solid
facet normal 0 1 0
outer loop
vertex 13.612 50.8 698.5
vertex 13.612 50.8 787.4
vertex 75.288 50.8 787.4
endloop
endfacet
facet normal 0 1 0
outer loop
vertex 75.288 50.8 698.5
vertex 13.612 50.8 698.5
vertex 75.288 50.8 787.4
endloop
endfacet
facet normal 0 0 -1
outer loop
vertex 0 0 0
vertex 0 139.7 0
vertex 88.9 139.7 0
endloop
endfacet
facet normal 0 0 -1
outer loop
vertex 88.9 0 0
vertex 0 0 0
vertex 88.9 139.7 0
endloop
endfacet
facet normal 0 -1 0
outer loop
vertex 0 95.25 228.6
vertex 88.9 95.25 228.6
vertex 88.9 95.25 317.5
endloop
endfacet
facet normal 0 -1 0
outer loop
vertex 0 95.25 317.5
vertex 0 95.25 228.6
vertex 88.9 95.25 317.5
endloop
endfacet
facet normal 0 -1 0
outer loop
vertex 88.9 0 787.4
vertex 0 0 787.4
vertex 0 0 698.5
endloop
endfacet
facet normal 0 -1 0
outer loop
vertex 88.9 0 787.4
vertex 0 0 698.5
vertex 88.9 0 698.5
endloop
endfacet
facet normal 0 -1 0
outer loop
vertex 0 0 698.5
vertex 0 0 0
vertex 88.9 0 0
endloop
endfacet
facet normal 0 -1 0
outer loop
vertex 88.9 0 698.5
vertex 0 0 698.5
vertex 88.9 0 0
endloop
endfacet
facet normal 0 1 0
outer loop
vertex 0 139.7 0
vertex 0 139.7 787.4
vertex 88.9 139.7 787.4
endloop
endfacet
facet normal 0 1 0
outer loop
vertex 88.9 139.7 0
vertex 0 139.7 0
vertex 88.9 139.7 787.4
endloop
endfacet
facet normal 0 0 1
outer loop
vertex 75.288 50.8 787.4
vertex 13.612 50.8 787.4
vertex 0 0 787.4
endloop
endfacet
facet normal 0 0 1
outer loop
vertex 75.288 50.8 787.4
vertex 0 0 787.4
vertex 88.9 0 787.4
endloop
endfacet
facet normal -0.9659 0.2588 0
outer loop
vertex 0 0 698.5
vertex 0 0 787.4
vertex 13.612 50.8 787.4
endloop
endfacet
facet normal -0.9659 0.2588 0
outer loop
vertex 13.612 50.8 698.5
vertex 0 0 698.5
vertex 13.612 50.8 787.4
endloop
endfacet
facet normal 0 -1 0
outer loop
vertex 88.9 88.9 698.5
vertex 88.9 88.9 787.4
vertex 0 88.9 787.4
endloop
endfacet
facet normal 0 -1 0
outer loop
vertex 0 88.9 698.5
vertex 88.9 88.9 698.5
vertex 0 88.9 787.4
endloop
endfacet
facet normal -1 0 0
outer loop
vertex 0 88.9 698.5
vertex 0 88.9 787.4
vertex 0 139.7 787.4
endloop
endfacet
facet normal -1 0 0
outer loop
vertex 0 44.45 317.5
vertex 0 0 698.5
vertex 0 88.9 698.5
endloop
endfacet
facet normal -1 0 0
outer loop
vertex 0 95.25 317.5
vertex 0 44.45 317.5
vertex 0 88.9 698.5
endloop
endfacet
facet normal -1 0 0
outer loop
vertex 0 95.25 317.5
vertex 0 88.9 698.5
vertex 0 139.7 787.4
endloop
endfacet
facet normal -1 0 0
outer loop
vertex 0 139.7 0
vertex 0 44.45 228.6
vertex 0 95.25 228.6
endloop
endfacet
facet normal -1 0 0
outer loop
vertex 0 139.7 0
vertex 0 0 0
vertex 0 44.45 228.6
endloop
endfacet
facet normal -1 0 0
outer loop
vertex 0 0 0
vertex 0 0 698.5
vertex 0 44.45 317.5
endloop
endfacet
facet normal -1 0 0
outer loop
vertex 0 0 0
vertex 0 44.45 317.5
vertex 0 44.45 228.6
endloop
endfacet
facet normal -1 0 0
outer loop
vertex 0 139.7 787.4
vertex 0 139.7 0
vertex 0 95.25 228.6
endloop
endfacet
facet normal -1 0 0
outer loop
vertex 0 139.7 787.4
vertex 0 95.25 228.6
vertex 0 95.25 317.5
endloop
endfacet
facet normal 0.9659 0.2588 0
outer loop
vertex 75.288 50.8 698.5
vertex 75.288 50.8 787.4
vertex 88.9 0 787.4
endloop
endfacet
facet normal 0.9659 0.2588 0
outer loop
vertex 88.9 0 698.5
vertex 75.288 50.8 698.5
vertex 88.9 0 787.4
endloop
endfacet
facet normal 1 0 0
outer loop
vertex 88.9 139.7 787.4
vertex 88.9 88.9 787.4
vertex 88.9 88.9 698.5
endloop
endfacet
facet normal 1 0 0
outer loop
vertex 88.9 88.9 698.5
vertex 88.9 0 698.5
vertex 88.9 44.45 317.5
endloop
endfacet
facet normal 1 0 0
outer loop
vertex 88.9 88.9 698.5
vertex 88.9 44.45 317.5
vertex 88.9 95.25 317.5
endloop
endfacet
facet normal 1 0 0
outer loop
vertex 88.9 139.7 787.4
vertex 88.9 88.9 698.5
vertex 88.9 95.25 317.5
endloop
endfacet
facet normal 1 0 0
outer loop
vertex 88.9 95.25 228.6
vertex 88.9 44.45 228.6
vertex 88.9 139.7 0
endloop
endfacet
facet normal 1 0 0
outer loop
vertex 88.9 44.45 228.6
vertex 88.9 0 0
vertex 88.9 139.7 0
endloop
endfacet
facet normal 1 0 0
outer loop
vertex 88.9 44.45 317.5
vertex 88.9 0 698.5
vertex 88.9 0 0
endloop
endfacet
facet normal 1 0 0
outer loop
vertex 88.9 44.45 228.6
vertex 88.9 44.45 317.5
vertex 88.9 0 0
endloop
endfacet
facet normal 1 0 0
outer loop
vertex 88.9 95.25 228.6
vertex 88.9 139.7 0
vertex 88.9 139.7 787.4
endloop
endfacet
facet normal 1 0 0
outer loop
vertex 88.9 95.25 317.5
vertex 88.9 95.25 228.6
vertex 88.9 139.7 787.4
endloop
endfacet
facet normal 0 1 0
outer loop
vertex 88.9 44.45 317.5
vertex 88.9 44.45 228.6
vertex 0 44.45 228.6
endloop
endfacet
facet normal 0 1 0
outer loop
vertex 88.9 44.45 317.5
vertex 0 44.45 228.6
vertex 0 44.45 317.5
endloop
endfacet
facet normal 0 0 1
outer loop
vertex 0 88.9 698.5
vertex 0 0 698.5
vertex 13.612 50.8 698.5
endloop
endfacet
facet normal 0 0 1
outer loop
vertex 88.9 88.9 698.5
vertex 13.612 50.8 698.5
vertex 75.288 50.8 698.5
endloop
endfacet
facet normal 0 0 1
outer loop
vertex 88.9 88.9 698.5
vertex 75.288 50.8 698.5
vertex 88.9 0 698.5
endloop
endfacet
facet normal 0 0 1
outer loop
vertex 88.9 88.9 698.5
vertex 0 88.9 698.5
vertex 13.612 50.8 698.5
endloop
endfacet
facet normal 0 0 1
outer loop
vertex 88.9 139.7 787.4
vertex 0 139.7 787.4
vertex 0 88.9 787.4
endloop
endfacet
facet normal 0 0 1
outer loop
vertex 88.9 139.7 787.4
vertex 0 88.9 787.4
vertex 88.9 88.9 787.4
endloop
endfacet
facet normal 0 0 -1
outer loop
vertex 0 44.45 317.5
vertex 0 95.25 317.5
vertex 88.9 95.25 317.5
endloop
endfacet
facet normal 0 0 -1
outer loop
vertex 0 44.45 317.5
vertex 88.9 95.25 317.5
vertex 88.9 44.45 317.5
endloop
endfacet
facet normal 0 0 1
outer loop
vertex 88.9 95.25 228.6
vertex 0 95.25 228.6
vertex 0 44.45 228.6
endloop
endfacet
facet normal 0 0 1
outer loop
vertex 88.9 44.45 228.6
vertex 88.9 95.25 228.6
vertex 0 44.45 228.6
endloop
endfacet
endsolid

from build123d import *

# Parameters (mm, degrees)
F0_W     = 88.9
F0_H     = 139.7
F1_DEPTH = 787.4
F3_DEPTH = 88.9
F4_W     = 50.8
F4_H     = 88.9
F5_DEPTH = 88.9


with BuildPart() as f1:
    # F0 (on Top) → F1 (new body)
    with BuildSketch(Plane.XY):
        with Locations((44.45, 69.85)):
            Rectangle(F0_W, F0_H)
    extrude(amount=F1_DEPTH)

    # F2 (on face) → F3 (cut)
    with BuildSketch(Plane.XY.offset(787.4)):
        Polygon((0, 88.9), (0, 0), (13.611819, 50.8), (75.288181, 50.8), (88.9, 0), (88.9, 88.9), align=None)
    extrude(amount=-F3_DEPTH, mode=Mode.SUBTRACT)

    # F4 (on face) → F5 (cut, through all)
    with BuildSketch(Plane(origin=(0, 0, 0), x_dir=(0, -1, 0), z_dir=(-1, 0, 0))):
        with Locations((-69.85, 273.05)):
            Rectangle(F4_W, F4_H)
    extrude(amount=-F5_DEPTH, mode=Mode.SUBTRACT)


solid = f1.part
